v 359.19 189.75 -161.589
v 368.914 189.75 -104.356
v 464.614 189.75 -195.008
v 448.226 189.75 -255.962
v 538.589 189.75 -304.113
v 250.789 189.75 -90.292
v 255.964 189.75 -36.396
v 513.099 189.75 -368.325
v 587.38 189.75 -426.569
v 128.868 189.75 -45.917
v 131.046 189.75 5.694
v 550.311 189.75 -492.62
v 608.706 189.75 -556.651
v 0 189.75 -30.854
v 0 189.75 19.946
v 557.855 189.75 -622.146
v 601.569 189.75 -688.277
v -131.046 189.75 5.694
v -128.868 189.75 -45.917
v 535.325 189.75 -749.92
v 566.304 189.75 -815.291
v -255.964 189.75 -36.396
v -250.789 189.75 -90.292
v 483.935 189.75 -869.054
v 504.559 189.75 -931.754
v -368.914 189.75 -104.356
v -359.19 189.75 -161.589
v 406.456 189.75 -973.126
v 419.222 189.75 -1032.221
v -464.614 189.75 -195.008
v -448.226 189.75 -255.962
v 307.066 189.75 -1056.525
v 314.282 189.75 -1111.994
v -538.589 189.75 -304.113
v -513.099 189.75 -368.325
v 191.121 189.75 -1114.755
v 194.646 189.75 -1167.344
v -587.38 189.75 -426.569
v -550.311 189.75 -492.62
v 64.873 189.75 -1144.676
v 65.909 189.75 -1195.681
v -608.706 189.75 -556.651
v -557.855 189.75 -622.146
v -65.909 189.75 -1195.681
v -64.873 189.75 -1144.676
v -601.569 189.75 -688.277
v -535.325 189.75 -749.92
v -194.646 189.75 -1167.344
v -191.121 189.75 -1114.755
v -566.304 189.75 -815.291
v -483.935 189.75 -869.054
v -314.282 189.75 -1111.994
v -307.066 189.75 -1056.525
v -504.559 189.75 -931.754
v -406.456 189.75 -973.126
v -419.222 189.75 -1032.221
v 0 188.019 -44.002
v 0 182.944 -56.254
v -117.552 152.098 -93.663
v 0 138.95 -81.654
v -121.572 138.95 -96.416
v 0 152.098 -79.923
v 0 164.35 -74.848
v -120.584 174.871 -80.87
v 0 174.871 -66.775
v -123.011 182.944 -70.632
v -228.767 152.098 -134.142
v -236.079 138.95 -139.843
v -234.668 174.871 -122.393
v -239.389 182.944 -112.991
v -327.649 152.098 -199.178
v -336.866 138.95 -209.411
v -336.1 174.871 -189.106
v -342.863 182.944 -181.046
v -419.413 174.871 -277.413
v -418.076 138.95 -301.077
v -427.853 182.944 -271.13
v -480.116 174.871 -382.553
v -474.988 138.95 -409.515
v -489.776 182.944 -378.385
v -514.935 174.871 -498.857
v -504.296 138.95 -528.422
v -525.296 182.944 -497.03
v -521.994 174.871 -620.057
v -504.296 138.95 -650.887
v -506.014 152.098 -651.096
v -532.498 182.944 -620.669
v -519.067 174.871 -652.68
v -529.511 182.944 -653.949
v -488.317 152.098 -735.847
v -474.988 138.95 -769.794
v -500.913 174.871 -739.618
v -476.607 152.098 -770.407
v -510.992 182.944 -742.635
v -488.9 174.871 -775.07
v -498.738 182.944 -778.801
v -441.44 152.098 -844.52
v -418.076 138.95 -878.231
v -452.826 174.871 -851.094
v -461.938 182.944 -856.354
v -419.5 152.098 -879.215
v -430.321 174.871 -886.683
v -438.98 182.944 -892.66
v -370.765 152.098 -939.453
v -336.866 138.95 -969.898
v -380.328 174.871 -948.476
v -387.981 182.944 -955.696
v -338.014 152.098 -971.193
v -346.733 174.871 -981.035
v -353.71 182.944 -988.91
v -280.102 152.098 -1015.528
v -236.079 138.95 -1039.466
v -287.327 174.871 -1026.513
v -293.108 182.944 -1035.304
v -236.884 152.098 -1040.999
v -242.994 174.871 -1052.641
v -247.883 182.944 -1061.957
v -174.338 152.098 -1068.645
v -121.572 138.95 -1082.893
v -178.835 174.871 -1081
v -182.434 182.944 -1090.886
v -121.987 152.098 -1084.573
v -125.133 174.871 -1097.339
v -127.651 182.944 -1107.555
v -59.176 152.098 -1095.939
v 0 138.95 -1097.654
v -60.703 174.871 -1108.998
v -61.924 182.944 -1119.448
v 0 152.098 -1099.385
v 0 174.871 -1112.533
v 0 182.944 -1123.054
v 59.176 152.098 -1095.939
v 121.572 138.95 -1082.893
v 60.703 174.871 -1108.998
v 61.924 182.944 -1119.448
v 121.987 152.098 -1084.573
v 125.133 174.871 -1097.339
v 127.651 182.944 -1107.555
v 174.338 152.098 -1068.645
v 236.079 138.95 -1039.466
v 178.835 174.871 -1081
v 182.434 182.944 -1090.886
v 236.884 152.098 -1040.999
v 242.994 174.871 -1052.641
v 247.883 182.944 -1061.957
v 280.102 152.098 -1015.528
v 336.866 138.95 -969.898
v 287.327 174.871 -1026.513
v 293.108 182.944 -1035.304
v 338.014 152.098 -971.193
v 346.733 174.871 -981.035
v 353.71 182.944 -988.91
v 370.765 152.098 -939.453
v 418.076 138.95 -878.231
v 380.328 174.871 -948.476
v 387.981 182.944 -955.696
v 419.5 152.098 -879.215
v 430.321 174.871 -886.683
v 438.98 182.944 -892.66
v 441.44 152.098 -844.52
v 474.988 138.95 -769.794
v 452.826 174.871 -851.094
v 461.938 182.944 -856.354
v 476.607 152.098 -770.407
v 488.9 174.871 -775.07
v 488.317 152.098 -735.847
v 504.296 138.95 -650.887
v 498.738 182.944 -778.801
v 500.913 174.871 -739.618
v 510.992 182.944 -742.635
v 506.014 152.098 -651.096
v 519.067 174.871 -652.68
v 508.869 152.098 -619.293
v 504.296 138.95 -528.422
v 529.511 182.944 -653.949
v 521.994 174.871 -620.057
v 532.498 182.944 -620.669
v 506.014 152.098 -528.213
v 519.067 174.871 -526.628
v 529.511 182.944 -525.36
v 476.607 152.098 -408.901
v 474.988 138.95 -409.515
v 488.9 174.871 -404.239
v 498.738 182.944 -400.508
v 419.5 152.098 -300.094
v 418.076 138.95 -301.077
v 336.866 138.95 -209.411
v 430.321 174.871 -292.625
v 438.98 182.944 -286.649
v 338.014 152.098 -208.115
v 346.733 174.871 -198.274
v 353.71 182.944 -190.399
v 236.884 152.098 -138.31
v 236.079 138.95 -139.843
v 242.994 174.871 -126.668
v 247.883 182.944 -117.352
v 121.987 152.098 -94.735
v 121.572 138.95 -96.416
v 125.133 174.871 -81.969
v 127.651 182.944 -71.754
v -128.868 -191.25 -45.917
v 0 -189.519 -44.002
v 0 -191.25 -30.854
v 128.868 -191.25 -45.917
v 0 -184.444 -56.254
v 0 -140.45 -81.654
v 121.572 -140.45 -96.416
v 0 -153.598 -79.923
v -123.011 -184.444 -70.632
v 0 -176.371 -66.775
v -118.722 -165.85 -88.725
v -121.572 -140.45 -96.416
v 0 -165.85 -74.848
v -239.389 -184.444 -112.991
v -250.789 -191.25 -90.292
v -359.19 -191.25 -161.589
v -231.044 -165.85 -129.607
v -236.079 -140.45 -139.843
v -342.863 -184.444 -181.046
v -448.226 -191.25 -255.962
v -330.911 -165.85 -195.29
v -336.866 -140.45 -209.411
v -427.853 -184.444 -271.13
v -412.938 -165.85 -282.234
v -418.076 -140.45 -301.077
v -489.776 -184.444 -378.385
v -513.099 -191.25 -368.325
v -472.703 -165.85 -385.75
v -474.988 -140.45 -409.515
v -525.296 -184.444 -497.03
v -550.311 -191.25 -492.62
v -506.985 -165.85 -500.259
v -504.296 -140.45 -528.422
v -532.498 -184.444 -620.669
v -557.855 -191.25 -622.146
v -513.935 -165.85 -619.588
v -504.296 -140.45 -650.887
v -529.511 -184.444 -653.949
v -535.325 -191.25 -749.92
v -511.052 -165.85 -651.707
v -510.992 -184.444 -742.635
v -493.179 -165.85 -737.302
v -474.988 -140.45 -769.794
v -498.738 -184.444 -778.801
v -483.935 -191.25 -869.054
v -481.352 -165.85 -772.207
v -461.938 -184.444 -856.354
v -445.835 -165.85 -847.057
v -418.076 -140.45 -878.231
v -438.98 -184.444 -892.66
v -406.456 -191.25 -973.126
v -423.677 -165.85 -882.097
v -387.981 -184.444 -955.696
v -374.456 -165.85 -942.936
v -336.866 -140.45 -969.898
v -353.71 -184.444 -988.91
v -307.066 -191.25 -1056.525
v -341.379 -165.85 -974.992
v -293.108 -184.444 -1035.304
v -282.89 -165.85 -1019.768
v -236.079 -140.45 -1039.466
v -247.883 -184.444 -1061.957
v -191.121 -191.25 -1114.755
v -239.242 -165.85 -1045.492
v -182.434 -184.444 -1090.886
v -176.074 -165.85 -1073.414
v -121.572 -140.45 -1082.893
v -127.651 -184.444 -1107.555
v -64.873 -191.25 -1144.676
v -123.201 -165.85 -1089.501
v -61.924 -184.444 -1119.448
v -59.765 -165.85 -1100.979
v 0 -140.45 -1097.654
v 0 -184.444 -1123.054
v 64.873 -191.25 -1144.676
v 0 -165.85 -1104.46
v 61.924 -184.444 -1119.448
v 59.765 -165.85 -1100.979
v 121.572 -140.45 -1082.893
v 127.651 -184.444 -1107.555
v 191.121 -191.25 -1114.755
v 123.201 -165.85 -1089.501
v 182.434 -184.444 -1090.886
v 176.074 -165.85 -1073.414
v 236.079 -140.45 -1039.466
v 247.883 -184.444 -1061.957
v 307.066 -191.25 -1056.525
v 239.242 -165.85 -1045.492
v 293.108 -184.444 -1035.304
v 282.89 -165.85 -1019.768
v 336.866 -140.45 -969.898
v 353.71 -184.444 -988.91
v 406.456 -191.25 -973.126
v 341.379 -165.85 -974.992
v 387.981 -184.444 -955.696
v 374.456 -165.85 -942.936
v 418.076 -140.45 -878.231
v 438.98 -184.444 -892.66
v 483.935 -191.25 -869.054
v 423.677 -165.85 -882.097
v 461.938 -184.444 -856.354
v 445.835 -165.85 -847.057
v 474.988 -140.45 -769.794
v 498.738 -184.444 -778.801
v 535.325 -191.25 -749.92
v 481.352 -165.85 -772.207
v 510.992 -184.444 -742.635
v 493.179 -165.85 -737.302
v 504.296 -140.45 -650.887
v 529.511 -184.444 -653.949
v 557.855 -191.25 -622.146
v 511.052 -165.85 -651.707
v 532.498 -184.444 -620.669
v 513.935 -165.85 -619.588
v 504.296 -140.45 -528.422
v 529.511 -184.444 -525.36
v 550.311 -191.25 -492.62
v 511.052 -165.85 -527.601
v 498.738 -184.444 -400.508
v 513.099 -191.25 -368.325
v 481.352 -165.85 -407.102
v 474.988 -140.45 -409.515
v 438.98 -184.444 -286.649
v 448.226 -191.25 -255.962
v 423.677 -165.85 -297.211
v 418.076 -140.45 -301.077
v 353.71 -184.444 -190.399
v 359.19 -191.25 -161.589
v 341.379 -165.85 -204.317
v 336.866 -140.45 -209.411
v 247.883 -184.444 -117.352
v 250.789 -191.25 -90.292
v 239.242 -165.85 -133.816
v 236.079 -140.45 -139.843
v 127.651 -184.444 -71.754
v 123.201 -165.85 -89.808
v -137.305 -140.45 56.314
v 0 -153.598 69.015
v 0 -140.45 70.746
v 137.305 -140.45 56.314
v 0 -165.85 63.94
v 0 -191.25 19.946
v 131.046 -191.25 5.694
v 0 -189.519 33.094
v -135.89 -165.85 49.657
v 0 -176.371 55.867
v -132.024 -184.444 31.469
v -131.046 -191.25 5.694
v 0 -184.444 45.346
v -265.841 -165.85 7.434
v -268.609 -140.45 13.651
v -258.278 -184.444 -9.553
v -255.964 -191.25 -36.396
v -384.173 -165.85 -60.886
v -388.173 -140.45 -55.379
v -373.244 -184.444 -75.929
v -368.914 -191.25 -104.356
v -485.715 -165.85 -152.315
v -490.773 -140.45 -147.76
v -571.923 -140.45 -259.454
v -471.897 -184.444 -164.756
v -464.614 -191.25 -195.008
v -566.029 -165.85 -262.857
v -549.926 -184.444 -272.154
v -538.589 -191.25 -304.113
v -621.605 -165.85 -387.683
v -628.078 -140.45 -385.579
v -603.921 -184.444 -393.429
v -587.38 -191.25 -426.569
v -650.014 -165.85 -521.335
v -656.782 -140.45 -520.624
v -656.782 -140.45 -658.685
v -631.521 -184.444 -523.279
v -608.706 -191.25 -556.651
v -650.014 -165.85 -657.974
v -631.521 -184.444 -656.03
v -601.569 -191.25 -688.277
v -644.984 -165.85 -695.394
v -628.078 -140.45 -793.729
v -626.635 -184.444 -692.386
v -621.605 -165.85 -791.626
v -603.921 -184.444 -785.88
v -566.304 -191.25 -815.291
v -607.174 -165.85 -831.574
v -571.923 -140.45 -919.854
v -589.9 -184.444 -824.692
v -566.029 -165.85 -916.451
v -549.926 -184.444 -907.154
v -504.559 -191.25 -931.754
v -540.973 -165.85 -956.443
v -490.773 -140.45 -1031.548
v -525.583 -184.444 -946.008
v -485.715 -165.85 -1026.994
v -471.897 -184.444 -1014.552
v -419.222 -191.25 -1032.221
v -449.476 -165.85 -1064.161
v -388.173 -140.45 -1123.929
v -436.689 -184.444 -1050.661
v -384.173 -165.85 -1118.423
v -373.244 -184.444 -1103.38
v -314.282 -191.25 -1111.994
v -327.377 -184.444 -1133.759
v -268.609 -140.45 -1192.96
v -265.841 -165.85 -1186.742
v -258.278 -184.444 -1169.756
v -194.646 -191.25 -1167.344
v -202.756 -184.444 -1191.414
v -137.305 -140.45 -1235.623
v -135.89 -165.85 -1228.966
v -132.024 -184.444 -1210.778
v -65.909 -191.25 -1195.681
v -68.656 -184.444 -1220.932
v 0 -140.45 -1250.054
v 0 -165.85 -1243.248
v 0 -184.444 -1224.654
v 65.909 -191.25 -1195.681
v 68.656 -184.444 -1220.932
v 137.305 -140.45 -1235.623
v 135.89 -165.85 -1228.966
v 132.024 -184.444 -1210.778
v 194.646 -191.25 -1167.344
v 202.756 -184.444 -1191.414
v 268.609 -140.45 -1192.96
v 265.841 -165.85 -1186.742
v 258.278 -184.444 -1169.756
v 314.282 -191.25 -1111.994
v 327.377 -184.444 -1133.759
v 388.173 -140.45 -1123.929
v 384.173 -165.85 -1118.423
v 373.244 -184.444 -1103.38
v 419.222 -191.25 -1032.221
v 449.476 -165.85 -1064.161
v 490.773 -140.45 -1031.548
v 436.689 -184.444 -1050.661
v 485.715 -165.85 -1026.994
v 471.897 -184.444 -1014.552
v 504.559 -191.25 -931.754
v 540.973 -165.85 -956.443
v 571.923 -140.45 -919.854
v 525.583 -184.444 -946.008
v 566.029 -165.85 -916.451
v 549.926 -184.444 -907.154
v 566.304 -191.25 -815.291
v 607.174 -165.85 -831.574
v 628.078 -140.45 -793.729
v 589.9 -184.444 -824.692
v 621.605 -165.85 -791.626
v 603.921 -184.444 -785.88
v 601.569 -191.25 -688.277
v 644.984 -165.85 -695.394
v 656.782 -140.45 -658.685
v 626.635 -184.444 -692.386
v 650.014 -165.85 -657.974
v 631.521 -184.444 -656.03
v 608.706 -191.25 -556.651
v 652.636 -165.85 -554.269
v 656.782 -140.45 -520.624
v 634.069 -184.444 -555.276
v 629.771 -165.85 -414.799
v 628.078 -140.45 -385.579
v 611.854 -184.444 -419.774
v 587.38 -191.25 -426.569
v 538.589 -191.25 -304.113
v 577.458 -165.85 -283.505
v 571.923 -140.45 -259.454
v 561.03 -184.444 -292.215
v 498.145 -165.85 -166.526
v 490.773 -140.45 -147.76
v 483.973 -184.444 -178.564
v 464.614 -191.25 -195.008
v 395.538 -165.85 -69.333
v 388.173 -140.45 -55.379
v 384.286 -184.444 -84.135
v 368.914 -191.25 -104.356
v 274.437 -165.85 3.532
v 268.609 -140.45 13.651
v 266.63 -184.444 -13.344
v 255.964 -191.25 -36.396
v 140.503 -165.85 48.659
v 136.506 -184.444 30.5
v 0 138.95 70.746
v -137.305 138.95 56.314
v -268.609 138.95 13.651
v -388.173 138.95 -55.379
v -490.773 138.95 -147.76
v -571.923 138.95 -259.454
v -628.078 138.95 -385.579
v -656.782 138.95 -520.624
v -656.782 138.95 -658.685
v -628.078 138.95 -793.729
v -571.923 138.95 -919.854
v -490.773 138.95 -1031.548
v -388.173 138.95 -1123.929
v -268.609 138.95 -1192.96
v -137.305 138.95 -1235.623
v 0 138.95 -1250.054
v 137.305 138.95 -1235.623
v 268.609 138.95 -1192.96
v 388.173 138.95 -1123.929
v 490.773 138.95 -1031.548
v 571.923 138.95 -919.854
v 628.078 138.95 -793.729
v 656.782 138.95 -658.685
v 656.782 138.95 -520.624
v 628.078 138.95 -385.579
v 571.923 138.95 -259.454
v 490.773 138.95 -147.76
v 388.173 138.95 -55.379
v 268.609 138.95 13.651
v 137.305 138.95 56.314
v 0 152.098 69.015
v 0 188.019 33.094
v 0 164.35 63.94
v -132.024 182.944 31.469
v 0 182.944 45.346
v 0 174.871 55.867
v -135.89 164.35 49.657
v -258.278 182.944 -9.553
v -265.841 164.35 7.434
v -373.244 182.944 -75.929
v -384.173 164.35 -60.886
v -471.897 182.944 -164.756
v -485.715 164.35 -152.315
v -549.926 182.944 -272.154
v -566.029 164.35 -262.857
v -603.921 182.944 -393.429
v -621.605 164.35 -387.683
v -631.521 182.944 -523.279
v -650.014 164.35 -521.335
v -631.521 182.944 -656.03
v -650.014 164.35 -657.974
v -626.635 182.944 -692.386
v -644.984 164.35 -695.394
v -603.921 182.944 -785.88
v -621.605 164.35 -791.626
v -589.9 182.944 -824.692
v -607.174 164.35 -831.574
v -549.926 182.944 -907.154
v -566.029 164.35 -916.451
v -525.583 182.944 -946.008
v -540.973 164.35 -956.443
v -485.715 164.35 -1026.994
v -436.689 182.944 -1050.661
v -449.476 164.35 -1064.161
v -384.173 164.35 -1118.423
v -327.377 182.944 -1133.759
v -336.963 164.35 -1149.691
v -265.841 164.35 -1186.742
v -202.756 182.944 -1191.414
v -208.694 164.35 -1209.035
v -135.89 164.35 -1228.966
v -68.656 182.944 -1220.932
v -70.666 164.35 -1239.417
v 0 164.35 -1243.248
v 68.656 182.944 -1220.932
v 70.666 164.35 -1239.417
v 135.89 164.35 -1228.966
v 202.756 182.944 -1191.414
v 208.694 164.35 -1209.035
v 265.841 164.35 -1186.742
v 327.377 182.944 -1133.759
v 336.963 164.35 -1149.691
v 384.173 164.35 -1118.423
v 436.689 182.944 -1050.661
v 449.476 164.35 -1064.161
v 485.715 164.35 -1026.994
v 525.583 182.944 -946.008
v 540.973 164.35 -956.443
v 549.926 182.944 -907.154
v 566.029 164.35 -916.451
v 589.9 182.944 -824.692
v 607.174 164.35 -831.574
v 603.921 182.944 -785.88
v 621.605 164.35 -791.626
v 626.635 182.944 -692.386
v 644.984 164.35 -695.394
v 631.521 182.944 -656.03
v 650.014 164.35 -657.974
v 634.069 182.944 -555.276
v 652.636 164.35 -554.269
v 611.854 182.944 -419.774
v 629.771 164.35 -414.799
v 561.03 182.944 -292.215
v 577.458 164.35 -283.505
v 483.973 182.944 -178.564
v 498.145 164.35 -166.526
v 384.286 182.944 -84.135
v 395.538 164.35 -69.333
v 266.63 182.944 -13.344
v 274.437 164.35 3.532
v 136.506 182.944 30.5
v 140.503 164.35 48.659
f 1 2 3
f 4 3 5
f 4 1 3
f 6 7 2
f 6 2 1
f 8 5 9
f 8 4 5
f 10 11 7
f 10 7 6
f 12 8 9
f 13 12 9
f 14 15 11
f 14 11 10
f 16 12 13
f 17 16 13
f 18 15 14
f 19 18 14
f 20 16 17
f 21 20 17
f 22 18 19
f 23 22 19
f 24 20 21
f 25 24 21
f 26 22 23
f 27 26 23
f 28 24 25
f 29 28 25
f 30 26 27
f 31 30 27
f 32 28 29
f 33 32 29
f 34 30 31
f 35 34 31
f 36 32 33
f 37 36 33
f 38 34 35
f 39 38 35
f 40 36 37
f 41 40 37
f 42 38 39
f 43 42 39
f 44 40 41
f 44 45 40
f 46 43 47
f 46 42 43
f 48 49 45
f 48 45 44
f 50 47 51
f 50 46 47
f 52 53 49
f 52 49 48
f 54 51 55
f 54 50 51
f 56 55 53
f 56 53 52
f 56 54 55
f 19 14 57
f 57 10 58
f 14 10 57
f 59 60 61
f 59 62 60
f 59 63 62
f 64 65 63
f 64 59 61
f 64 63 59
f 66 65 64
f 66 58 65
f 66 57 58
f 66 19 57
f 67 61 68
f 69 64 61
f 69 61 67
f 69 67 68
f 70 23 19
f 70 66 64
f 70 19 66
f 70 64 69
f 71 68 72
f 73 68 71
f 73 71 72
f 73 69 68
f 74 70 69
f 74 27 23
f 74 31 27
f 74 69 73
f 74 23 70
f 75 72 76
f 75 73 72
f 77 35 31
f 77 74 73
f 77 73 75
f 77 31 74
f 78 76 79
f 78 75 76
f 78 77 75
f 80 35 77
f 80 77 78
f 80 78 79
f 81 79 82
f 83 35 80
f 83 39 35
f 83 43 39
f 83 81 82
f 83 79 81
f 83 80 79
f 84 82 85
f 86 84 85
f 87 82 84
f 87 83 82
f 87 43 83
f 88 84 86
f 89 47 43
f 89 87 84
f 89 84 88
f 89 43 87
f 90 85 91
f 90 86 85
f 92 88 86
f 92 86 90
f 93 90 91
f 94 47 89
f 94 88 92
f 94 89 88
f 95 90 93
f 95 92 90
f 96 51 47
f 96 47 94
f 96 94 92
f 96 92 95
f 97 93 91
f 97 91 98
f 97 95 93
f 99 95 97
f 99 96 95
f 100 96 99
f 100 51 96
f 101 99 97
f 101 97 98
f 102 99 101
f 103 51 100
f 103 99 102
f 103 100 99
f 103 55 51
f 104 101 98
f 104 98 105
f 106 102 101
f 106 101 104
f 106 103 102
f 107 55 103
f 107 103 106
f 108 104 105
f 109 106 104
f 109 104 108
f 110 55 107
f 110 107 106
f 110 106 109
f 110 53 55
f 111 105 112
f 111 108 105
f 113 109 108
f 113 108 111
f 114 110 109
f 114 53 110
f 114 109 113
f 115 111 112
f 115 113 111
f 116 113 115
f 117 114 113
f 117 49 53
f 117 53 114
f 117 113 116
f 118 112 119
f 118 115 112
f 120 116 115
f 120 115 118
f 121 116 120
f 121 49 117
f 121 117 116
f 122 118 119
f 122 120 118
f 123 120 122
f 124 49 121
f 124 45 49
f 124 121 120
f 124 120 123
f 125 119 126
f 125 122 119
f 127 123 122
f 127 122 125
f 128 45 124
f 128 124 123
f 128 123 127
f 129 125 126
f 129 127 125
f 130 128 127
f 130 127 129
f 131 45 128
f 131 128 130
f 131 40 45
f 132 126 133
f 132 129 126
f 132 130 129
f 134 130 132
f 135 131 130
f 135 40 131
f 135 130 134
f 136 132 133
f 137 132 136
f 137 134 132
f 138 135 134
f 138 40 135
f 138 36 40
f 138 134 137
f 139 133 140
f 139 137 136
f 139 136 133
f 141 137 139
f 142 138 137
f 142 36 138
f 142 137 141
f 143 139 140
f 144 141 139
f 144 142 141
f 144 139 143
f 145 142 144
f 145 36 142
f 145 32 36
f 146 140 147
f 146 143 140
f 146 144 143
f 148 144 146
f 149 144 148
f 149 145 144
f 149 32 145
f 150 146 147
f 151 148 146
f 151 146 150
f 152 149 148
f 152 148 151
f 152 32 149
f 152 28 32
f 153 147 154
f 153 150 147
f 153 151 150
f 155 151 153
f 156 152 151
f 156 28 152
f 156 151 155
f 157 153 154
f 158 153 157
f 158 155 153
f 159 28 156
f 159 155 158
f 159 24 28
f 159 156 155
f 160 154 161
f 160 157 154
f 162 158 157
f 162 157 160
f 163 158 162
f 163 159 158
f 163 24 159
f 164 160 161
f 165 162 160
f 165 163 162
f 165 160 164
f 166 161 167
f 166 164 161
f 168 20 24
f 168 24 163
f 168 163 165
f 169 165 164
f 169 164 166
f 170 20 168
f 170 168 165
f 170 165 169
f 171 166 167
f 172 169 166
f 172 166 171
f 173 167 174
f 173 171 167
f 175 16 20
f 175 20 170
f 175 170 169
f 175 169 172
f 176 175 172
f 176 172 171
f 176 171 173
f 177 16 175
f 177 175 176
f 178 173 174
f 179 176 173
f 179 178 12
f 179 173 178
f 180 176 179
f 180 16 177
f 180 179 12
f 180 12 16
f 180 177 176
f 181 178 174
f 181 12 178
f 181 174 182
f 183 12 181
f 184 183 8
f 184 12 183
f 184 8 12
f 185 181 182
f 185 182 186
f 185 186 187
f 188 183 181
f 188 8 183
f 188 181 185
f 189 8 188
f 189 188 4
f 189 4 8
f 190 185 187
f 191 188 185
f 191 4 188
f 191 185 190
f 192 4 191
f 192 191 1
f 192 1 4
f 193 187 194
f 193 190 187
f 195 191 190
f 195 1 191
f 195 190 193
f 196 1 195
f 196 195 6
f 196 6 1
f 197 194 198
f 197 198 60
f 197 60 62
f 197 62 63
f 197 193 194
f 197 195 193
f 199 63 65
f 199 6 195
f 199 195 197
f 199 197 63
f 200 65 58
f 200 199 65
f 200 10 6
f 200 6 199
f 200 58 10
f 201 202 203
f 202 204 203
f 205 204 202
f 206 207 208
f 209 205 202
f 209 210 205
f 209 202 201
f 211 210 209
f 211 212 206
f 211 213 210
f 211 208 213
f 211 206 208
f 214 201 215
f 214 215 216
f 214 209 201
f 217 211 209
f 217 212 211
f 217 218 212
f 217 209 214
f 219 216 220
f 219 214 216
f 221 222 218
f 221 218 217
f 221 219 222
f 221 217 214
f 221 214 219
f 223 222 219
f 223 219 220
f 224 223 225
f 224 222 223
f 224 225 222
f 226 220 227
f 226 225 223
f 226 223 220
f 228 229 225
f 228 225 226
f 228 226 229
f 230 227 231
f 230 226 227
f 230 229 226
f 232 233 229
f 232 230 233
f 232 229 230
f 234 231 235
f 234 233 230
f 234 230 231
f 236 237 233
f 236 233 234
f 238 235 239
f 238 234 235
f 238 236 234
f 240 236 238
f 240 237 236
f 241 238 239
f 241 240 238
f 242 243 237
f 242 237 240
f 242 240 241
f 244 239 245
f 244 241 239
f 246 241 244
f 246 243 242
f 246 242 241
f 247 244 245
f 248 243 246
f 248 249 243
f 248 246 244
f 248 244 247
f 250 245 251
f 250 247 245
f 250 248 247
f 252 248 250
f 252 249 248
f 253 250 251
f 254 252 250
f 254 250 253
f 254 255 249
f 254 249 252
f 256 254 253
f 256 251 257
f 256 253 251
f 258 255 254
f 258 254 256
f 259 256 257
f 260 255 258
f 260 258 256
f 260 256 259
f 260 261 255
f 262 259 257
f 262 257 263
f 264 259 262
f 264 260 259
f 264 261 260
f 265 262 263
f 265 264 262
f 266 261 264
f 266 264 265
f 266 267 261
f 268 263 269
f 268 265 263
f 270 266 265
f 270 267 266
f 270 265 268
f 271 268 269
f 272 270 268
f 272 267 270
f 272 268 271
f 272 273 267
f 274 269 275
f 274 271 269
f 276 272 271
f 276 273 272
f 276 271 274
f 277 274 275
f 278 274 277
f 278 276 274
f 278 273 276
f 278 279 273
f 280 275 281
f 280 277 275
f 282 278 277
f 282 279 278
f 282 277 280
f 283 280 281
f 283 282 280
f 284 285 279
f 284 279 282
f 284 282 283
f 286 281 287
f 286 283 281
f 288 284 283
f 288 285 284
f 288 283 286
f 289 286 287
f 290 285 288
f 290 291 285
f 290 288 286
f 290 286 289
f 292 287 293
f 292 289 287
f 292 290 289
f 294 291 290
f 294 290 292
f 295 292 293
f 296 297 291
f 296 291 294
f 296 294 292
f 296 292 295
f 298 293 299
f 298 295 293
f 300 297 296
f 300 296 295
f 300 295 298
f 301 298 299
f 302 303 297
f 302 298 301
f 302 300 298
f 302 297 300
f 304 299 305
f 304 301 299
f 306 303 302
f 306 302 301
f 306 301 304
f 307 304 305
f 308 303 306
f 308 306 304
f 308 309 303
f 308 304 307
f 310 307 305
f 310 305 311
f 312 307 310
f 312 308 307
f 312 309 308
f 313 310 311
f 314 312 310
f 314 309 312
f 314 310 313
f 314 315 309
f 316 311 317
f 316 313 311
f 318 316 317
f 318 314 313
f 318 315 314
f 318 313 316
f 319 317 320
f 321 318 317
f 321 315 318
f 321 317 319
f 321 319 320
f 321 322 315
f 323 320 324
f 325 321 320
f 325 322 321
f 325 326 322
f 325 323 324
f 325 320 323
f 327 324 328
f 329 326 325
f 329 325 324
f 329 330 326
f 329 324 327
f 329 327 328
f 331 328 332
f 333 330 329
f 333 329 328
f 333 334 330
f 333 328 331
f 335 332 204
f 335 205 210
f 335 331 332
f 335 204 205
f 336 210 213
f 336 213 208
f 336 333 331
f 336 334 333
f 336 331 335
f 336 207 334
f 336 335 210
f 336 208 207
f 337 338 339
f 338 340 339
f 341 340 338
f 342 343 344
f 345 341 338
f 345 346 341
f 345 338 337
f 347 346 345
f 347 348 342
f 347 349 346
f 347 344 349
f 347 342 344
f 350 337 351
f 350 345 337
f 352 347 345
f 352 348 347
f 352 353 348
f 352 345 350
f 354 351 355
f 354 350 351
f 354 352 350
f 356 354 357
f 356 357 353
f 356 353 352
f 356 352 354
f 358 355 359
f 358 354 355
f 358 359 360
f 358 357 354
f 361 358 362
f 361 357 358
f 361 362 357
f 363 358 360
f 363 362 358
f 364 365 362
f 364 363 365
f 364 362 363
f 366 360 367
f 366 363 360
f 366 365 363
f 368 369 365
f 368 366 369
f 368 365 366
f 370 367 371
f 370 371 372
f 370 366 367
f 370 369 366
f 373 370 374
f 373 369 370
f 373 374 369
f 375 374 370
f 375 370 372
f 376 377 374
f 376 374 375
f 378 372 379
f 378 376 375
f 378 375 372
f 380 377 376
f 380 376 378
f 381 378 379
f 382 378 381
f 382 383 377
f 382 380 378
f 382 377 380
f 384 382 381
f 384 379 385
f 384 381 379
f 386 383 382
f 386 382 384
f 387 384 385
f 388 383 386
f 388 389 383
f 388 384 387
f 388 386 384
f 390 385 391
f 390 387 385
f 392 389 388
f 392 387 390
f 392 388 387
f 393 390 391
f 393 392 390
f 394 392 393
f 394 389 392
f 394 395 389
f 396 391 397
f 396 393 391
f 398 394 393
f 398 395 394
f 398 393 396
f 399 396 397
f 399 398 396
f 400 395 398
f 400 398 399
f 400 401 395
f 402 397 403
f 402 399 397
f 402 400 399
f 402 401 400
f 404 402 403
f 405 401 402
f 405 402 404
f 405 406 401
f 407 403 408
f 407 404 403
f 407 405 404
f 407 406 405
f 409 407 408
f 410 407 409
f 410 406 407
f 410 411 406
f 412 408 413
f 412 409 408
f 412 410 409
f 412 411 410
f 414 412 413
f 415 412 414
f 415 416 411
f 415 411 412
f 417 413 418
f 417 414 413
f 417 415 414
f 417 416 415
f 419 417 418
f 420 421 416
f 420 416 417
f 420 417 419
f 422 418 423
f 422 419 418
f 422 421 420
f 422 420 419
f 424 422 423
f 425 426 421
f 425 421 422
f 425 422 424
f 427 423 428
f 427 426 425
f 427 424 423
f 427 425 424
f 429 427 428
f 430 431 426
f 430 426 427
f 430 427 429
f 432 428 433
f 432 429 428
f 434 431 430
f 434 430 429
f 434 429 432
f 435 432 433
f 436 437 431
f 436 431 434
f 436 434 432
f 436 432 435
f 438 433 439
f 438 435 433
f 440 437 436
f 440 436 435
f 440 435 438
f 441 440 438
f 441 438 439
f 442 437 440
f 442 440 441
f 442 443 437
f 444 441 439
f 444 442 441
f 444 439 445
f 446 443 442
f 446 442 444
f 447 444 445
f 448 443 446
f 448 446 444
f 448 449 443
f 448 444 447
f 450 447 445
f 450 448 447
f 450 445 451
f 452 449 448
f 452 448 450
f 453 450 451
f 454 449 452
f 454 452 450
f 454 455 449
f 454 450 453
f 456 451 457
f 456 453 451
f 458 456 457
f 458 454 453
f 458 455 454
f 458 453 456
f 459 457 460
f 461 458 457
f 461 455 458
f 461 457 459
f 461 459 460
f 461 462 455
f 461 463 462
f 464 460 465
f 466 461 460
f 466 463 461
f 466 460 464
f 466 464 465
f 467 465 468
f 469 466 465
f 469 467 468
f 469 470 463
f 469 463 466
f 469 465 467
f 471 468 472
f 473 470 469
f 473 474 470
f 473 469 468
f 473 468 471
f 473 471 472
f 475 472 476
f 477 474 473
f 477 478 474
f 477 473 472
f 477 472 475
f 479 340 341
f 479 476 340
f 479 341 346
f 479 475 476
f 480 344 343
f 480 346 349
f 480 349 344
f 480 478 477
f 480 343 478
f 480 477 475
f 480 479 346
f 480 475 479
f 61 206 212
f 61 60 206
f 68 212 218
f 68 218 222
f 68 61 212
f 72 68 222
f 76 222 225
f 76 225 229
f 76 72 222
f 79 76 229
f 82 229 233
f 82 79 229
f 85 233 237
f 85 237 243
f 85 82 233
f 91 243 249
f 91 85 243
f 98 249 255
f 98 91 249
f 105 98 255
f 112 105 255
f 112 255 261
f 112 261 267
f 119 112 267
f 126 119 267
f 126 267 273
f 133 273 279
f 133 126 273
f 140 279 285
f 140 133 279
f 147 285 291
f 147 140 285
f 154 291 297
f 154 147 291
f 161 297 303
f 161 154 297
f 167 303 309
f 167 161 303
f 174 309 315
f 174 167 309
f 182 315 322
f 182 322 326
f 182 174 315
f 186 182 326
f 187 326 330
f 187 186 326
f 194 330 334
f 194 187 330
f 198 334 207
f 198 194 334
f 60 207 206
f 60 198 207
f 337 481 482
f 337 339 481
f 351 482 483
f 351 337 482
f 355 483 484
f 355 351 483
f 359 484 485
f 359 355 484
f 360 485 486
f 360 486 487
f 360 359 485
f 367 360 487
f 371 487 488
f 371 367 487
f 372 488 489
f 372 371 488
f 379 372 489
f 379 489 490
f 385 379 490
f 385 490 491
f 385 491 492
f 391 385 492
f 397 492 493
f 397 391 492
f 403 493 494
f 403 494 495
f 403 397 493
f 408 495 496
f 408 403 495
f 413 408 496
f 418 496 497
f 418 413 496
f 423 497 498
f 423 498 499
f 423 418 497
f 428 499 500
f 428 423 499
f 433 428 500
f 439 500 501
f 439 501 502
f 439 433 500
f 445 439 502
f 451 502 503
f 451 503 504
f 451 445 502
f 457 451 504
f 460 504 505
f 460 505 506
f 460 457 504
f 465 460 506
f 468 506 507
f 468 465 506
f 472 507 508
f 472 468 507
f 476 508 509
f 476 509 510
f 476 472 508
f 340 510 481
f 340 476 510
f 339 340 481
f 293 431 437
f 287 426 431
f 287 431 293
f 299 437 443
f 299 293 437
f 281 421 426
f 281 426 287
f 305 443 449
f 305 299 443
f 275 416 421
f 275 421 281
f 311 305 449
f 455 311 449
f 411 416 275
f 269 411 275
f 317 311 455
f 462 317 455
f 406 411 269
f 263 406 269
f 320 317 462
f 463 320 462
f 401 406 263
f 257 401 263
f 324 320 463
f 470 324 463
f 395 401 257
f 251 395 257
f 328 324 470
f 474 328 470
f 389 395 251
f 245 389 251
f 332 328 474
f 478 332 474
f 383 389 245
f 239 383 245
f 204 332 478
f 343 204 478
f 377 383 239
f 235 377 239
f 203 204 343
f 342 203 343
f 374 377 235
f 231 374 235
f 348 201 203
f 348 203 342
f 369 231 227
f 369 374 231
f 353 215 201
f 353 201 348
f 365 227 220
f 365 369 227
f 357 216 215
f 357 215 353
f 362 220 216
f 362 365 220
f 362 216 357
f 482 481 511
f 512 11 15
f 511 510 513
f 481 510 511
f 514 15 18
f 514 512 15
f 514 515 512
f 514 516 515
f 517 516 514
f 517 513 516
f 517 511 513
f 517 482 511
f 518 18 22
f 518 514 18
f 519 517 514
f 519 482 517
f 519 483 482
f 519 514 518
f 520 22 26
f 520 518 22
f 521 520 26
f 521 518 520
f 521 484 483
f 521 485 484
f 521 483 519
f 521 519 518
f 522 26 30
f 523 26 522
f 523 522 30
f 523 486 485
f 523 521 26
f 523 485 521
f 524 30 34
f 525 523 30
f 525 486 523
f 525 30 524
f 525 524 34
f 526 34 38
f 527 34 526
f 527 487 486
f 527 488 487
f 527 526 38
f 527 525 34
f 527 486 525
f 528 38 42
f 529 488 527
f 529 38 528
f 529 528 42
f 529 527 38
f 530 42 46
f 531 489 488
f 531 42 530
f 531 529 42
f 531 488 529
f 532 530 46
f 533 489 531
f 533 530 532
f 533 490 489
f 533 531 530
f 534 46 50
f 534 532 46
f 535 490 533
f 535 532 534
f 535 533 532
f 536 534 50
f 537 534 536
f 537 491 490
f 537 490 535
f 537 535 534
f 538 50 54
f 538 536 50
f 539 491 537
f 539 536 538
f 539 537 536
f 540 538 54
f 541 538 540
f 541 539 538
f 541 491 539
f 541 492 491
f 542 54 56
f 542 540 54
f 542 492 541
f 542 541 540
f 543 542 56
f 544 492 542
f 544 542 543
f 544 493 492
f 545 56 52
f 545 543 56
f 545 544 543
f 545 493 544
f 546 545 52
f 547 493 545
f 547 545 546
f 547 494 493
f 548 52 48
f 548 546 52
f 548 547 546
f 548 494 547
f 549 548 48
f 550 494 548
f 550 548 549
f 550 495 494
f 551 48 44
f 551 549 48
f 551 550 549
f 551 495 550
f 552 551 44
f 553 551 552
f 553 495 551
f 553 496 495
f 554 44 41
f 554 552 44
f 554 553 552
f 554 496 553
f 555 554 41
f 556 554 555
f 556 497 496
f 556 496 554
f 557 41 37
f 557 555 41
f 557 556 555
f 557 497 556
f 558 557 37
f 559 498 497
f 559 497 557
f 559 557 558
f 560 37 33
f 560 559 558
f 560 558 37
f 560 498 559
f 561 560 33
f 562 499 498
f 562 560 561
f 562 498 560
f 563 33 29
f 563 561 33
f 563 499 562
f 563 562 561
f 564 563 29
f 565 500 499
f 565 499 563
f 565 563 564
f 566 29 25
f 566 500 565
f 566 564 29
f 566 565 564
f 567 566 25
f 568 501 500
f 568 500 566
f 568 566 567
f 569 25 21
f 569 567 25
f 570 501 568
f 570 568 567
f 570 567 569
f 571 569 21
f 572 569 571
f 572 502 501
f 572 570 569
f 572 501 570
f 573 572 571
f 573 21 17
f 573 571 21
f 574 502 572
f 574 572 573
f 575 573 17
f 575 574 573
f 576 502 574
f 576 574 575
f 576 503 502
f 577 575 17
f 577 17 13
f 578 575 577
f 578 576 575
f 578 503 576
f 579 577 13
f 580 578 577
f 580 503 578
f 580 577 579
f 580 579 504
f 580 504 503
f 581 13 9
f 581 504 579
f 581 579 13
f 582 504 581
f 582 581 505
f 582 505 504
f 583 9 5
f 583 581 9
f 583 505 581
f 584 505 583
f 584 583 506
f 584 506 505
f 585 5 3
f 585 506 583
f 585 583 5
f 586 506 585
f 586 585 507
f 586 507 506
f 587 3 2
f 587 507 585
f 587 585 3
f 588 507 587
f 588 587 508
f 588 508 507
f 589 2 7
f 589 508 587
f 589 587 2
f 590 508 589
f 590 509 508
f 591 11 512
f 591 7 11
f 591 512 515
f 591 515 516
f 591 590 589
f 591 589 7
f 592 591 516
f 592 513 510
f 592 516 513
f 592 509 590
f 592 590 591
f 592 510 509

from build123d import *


with BuildPart() as f1:
    # F0 (on Right) → F1 (revolve)
    with BuildSketch(Plane.YZ):
        with BuildLine():
            ThreePointArc((189.750242, 19.945681), (174.871267, 55.866706), (138.950242, 70.745681))
            Line((138.950242, 70.745681), (-140.449758, 70.745681))
            ThreePointArc((-140.449758, 70.745681), (-176.370782, 55.866706), (-191.249758, 19.945681))
            Line((-191.249758, 19.945681), (-191.249758, -30.854319))
            ThreePointArc((-191.249758, -30.854319), (-176.370782, -66.775343), (-140.449758, -81.654319))
            Line((-140.449758, -81.654319), (138.950242, -81.654319))
            ThreePointArc((138.950242, -81.654319), (174.871267, -66.775343), (189.750242, -30.854319))
            Line((189.750242, -30.854319), (189.750242, 19.945681))
        make_face()
    revolve(axis=Axis((0, -0.749758, -589.654319), (0, -1, 0)))


solid = f1.part
